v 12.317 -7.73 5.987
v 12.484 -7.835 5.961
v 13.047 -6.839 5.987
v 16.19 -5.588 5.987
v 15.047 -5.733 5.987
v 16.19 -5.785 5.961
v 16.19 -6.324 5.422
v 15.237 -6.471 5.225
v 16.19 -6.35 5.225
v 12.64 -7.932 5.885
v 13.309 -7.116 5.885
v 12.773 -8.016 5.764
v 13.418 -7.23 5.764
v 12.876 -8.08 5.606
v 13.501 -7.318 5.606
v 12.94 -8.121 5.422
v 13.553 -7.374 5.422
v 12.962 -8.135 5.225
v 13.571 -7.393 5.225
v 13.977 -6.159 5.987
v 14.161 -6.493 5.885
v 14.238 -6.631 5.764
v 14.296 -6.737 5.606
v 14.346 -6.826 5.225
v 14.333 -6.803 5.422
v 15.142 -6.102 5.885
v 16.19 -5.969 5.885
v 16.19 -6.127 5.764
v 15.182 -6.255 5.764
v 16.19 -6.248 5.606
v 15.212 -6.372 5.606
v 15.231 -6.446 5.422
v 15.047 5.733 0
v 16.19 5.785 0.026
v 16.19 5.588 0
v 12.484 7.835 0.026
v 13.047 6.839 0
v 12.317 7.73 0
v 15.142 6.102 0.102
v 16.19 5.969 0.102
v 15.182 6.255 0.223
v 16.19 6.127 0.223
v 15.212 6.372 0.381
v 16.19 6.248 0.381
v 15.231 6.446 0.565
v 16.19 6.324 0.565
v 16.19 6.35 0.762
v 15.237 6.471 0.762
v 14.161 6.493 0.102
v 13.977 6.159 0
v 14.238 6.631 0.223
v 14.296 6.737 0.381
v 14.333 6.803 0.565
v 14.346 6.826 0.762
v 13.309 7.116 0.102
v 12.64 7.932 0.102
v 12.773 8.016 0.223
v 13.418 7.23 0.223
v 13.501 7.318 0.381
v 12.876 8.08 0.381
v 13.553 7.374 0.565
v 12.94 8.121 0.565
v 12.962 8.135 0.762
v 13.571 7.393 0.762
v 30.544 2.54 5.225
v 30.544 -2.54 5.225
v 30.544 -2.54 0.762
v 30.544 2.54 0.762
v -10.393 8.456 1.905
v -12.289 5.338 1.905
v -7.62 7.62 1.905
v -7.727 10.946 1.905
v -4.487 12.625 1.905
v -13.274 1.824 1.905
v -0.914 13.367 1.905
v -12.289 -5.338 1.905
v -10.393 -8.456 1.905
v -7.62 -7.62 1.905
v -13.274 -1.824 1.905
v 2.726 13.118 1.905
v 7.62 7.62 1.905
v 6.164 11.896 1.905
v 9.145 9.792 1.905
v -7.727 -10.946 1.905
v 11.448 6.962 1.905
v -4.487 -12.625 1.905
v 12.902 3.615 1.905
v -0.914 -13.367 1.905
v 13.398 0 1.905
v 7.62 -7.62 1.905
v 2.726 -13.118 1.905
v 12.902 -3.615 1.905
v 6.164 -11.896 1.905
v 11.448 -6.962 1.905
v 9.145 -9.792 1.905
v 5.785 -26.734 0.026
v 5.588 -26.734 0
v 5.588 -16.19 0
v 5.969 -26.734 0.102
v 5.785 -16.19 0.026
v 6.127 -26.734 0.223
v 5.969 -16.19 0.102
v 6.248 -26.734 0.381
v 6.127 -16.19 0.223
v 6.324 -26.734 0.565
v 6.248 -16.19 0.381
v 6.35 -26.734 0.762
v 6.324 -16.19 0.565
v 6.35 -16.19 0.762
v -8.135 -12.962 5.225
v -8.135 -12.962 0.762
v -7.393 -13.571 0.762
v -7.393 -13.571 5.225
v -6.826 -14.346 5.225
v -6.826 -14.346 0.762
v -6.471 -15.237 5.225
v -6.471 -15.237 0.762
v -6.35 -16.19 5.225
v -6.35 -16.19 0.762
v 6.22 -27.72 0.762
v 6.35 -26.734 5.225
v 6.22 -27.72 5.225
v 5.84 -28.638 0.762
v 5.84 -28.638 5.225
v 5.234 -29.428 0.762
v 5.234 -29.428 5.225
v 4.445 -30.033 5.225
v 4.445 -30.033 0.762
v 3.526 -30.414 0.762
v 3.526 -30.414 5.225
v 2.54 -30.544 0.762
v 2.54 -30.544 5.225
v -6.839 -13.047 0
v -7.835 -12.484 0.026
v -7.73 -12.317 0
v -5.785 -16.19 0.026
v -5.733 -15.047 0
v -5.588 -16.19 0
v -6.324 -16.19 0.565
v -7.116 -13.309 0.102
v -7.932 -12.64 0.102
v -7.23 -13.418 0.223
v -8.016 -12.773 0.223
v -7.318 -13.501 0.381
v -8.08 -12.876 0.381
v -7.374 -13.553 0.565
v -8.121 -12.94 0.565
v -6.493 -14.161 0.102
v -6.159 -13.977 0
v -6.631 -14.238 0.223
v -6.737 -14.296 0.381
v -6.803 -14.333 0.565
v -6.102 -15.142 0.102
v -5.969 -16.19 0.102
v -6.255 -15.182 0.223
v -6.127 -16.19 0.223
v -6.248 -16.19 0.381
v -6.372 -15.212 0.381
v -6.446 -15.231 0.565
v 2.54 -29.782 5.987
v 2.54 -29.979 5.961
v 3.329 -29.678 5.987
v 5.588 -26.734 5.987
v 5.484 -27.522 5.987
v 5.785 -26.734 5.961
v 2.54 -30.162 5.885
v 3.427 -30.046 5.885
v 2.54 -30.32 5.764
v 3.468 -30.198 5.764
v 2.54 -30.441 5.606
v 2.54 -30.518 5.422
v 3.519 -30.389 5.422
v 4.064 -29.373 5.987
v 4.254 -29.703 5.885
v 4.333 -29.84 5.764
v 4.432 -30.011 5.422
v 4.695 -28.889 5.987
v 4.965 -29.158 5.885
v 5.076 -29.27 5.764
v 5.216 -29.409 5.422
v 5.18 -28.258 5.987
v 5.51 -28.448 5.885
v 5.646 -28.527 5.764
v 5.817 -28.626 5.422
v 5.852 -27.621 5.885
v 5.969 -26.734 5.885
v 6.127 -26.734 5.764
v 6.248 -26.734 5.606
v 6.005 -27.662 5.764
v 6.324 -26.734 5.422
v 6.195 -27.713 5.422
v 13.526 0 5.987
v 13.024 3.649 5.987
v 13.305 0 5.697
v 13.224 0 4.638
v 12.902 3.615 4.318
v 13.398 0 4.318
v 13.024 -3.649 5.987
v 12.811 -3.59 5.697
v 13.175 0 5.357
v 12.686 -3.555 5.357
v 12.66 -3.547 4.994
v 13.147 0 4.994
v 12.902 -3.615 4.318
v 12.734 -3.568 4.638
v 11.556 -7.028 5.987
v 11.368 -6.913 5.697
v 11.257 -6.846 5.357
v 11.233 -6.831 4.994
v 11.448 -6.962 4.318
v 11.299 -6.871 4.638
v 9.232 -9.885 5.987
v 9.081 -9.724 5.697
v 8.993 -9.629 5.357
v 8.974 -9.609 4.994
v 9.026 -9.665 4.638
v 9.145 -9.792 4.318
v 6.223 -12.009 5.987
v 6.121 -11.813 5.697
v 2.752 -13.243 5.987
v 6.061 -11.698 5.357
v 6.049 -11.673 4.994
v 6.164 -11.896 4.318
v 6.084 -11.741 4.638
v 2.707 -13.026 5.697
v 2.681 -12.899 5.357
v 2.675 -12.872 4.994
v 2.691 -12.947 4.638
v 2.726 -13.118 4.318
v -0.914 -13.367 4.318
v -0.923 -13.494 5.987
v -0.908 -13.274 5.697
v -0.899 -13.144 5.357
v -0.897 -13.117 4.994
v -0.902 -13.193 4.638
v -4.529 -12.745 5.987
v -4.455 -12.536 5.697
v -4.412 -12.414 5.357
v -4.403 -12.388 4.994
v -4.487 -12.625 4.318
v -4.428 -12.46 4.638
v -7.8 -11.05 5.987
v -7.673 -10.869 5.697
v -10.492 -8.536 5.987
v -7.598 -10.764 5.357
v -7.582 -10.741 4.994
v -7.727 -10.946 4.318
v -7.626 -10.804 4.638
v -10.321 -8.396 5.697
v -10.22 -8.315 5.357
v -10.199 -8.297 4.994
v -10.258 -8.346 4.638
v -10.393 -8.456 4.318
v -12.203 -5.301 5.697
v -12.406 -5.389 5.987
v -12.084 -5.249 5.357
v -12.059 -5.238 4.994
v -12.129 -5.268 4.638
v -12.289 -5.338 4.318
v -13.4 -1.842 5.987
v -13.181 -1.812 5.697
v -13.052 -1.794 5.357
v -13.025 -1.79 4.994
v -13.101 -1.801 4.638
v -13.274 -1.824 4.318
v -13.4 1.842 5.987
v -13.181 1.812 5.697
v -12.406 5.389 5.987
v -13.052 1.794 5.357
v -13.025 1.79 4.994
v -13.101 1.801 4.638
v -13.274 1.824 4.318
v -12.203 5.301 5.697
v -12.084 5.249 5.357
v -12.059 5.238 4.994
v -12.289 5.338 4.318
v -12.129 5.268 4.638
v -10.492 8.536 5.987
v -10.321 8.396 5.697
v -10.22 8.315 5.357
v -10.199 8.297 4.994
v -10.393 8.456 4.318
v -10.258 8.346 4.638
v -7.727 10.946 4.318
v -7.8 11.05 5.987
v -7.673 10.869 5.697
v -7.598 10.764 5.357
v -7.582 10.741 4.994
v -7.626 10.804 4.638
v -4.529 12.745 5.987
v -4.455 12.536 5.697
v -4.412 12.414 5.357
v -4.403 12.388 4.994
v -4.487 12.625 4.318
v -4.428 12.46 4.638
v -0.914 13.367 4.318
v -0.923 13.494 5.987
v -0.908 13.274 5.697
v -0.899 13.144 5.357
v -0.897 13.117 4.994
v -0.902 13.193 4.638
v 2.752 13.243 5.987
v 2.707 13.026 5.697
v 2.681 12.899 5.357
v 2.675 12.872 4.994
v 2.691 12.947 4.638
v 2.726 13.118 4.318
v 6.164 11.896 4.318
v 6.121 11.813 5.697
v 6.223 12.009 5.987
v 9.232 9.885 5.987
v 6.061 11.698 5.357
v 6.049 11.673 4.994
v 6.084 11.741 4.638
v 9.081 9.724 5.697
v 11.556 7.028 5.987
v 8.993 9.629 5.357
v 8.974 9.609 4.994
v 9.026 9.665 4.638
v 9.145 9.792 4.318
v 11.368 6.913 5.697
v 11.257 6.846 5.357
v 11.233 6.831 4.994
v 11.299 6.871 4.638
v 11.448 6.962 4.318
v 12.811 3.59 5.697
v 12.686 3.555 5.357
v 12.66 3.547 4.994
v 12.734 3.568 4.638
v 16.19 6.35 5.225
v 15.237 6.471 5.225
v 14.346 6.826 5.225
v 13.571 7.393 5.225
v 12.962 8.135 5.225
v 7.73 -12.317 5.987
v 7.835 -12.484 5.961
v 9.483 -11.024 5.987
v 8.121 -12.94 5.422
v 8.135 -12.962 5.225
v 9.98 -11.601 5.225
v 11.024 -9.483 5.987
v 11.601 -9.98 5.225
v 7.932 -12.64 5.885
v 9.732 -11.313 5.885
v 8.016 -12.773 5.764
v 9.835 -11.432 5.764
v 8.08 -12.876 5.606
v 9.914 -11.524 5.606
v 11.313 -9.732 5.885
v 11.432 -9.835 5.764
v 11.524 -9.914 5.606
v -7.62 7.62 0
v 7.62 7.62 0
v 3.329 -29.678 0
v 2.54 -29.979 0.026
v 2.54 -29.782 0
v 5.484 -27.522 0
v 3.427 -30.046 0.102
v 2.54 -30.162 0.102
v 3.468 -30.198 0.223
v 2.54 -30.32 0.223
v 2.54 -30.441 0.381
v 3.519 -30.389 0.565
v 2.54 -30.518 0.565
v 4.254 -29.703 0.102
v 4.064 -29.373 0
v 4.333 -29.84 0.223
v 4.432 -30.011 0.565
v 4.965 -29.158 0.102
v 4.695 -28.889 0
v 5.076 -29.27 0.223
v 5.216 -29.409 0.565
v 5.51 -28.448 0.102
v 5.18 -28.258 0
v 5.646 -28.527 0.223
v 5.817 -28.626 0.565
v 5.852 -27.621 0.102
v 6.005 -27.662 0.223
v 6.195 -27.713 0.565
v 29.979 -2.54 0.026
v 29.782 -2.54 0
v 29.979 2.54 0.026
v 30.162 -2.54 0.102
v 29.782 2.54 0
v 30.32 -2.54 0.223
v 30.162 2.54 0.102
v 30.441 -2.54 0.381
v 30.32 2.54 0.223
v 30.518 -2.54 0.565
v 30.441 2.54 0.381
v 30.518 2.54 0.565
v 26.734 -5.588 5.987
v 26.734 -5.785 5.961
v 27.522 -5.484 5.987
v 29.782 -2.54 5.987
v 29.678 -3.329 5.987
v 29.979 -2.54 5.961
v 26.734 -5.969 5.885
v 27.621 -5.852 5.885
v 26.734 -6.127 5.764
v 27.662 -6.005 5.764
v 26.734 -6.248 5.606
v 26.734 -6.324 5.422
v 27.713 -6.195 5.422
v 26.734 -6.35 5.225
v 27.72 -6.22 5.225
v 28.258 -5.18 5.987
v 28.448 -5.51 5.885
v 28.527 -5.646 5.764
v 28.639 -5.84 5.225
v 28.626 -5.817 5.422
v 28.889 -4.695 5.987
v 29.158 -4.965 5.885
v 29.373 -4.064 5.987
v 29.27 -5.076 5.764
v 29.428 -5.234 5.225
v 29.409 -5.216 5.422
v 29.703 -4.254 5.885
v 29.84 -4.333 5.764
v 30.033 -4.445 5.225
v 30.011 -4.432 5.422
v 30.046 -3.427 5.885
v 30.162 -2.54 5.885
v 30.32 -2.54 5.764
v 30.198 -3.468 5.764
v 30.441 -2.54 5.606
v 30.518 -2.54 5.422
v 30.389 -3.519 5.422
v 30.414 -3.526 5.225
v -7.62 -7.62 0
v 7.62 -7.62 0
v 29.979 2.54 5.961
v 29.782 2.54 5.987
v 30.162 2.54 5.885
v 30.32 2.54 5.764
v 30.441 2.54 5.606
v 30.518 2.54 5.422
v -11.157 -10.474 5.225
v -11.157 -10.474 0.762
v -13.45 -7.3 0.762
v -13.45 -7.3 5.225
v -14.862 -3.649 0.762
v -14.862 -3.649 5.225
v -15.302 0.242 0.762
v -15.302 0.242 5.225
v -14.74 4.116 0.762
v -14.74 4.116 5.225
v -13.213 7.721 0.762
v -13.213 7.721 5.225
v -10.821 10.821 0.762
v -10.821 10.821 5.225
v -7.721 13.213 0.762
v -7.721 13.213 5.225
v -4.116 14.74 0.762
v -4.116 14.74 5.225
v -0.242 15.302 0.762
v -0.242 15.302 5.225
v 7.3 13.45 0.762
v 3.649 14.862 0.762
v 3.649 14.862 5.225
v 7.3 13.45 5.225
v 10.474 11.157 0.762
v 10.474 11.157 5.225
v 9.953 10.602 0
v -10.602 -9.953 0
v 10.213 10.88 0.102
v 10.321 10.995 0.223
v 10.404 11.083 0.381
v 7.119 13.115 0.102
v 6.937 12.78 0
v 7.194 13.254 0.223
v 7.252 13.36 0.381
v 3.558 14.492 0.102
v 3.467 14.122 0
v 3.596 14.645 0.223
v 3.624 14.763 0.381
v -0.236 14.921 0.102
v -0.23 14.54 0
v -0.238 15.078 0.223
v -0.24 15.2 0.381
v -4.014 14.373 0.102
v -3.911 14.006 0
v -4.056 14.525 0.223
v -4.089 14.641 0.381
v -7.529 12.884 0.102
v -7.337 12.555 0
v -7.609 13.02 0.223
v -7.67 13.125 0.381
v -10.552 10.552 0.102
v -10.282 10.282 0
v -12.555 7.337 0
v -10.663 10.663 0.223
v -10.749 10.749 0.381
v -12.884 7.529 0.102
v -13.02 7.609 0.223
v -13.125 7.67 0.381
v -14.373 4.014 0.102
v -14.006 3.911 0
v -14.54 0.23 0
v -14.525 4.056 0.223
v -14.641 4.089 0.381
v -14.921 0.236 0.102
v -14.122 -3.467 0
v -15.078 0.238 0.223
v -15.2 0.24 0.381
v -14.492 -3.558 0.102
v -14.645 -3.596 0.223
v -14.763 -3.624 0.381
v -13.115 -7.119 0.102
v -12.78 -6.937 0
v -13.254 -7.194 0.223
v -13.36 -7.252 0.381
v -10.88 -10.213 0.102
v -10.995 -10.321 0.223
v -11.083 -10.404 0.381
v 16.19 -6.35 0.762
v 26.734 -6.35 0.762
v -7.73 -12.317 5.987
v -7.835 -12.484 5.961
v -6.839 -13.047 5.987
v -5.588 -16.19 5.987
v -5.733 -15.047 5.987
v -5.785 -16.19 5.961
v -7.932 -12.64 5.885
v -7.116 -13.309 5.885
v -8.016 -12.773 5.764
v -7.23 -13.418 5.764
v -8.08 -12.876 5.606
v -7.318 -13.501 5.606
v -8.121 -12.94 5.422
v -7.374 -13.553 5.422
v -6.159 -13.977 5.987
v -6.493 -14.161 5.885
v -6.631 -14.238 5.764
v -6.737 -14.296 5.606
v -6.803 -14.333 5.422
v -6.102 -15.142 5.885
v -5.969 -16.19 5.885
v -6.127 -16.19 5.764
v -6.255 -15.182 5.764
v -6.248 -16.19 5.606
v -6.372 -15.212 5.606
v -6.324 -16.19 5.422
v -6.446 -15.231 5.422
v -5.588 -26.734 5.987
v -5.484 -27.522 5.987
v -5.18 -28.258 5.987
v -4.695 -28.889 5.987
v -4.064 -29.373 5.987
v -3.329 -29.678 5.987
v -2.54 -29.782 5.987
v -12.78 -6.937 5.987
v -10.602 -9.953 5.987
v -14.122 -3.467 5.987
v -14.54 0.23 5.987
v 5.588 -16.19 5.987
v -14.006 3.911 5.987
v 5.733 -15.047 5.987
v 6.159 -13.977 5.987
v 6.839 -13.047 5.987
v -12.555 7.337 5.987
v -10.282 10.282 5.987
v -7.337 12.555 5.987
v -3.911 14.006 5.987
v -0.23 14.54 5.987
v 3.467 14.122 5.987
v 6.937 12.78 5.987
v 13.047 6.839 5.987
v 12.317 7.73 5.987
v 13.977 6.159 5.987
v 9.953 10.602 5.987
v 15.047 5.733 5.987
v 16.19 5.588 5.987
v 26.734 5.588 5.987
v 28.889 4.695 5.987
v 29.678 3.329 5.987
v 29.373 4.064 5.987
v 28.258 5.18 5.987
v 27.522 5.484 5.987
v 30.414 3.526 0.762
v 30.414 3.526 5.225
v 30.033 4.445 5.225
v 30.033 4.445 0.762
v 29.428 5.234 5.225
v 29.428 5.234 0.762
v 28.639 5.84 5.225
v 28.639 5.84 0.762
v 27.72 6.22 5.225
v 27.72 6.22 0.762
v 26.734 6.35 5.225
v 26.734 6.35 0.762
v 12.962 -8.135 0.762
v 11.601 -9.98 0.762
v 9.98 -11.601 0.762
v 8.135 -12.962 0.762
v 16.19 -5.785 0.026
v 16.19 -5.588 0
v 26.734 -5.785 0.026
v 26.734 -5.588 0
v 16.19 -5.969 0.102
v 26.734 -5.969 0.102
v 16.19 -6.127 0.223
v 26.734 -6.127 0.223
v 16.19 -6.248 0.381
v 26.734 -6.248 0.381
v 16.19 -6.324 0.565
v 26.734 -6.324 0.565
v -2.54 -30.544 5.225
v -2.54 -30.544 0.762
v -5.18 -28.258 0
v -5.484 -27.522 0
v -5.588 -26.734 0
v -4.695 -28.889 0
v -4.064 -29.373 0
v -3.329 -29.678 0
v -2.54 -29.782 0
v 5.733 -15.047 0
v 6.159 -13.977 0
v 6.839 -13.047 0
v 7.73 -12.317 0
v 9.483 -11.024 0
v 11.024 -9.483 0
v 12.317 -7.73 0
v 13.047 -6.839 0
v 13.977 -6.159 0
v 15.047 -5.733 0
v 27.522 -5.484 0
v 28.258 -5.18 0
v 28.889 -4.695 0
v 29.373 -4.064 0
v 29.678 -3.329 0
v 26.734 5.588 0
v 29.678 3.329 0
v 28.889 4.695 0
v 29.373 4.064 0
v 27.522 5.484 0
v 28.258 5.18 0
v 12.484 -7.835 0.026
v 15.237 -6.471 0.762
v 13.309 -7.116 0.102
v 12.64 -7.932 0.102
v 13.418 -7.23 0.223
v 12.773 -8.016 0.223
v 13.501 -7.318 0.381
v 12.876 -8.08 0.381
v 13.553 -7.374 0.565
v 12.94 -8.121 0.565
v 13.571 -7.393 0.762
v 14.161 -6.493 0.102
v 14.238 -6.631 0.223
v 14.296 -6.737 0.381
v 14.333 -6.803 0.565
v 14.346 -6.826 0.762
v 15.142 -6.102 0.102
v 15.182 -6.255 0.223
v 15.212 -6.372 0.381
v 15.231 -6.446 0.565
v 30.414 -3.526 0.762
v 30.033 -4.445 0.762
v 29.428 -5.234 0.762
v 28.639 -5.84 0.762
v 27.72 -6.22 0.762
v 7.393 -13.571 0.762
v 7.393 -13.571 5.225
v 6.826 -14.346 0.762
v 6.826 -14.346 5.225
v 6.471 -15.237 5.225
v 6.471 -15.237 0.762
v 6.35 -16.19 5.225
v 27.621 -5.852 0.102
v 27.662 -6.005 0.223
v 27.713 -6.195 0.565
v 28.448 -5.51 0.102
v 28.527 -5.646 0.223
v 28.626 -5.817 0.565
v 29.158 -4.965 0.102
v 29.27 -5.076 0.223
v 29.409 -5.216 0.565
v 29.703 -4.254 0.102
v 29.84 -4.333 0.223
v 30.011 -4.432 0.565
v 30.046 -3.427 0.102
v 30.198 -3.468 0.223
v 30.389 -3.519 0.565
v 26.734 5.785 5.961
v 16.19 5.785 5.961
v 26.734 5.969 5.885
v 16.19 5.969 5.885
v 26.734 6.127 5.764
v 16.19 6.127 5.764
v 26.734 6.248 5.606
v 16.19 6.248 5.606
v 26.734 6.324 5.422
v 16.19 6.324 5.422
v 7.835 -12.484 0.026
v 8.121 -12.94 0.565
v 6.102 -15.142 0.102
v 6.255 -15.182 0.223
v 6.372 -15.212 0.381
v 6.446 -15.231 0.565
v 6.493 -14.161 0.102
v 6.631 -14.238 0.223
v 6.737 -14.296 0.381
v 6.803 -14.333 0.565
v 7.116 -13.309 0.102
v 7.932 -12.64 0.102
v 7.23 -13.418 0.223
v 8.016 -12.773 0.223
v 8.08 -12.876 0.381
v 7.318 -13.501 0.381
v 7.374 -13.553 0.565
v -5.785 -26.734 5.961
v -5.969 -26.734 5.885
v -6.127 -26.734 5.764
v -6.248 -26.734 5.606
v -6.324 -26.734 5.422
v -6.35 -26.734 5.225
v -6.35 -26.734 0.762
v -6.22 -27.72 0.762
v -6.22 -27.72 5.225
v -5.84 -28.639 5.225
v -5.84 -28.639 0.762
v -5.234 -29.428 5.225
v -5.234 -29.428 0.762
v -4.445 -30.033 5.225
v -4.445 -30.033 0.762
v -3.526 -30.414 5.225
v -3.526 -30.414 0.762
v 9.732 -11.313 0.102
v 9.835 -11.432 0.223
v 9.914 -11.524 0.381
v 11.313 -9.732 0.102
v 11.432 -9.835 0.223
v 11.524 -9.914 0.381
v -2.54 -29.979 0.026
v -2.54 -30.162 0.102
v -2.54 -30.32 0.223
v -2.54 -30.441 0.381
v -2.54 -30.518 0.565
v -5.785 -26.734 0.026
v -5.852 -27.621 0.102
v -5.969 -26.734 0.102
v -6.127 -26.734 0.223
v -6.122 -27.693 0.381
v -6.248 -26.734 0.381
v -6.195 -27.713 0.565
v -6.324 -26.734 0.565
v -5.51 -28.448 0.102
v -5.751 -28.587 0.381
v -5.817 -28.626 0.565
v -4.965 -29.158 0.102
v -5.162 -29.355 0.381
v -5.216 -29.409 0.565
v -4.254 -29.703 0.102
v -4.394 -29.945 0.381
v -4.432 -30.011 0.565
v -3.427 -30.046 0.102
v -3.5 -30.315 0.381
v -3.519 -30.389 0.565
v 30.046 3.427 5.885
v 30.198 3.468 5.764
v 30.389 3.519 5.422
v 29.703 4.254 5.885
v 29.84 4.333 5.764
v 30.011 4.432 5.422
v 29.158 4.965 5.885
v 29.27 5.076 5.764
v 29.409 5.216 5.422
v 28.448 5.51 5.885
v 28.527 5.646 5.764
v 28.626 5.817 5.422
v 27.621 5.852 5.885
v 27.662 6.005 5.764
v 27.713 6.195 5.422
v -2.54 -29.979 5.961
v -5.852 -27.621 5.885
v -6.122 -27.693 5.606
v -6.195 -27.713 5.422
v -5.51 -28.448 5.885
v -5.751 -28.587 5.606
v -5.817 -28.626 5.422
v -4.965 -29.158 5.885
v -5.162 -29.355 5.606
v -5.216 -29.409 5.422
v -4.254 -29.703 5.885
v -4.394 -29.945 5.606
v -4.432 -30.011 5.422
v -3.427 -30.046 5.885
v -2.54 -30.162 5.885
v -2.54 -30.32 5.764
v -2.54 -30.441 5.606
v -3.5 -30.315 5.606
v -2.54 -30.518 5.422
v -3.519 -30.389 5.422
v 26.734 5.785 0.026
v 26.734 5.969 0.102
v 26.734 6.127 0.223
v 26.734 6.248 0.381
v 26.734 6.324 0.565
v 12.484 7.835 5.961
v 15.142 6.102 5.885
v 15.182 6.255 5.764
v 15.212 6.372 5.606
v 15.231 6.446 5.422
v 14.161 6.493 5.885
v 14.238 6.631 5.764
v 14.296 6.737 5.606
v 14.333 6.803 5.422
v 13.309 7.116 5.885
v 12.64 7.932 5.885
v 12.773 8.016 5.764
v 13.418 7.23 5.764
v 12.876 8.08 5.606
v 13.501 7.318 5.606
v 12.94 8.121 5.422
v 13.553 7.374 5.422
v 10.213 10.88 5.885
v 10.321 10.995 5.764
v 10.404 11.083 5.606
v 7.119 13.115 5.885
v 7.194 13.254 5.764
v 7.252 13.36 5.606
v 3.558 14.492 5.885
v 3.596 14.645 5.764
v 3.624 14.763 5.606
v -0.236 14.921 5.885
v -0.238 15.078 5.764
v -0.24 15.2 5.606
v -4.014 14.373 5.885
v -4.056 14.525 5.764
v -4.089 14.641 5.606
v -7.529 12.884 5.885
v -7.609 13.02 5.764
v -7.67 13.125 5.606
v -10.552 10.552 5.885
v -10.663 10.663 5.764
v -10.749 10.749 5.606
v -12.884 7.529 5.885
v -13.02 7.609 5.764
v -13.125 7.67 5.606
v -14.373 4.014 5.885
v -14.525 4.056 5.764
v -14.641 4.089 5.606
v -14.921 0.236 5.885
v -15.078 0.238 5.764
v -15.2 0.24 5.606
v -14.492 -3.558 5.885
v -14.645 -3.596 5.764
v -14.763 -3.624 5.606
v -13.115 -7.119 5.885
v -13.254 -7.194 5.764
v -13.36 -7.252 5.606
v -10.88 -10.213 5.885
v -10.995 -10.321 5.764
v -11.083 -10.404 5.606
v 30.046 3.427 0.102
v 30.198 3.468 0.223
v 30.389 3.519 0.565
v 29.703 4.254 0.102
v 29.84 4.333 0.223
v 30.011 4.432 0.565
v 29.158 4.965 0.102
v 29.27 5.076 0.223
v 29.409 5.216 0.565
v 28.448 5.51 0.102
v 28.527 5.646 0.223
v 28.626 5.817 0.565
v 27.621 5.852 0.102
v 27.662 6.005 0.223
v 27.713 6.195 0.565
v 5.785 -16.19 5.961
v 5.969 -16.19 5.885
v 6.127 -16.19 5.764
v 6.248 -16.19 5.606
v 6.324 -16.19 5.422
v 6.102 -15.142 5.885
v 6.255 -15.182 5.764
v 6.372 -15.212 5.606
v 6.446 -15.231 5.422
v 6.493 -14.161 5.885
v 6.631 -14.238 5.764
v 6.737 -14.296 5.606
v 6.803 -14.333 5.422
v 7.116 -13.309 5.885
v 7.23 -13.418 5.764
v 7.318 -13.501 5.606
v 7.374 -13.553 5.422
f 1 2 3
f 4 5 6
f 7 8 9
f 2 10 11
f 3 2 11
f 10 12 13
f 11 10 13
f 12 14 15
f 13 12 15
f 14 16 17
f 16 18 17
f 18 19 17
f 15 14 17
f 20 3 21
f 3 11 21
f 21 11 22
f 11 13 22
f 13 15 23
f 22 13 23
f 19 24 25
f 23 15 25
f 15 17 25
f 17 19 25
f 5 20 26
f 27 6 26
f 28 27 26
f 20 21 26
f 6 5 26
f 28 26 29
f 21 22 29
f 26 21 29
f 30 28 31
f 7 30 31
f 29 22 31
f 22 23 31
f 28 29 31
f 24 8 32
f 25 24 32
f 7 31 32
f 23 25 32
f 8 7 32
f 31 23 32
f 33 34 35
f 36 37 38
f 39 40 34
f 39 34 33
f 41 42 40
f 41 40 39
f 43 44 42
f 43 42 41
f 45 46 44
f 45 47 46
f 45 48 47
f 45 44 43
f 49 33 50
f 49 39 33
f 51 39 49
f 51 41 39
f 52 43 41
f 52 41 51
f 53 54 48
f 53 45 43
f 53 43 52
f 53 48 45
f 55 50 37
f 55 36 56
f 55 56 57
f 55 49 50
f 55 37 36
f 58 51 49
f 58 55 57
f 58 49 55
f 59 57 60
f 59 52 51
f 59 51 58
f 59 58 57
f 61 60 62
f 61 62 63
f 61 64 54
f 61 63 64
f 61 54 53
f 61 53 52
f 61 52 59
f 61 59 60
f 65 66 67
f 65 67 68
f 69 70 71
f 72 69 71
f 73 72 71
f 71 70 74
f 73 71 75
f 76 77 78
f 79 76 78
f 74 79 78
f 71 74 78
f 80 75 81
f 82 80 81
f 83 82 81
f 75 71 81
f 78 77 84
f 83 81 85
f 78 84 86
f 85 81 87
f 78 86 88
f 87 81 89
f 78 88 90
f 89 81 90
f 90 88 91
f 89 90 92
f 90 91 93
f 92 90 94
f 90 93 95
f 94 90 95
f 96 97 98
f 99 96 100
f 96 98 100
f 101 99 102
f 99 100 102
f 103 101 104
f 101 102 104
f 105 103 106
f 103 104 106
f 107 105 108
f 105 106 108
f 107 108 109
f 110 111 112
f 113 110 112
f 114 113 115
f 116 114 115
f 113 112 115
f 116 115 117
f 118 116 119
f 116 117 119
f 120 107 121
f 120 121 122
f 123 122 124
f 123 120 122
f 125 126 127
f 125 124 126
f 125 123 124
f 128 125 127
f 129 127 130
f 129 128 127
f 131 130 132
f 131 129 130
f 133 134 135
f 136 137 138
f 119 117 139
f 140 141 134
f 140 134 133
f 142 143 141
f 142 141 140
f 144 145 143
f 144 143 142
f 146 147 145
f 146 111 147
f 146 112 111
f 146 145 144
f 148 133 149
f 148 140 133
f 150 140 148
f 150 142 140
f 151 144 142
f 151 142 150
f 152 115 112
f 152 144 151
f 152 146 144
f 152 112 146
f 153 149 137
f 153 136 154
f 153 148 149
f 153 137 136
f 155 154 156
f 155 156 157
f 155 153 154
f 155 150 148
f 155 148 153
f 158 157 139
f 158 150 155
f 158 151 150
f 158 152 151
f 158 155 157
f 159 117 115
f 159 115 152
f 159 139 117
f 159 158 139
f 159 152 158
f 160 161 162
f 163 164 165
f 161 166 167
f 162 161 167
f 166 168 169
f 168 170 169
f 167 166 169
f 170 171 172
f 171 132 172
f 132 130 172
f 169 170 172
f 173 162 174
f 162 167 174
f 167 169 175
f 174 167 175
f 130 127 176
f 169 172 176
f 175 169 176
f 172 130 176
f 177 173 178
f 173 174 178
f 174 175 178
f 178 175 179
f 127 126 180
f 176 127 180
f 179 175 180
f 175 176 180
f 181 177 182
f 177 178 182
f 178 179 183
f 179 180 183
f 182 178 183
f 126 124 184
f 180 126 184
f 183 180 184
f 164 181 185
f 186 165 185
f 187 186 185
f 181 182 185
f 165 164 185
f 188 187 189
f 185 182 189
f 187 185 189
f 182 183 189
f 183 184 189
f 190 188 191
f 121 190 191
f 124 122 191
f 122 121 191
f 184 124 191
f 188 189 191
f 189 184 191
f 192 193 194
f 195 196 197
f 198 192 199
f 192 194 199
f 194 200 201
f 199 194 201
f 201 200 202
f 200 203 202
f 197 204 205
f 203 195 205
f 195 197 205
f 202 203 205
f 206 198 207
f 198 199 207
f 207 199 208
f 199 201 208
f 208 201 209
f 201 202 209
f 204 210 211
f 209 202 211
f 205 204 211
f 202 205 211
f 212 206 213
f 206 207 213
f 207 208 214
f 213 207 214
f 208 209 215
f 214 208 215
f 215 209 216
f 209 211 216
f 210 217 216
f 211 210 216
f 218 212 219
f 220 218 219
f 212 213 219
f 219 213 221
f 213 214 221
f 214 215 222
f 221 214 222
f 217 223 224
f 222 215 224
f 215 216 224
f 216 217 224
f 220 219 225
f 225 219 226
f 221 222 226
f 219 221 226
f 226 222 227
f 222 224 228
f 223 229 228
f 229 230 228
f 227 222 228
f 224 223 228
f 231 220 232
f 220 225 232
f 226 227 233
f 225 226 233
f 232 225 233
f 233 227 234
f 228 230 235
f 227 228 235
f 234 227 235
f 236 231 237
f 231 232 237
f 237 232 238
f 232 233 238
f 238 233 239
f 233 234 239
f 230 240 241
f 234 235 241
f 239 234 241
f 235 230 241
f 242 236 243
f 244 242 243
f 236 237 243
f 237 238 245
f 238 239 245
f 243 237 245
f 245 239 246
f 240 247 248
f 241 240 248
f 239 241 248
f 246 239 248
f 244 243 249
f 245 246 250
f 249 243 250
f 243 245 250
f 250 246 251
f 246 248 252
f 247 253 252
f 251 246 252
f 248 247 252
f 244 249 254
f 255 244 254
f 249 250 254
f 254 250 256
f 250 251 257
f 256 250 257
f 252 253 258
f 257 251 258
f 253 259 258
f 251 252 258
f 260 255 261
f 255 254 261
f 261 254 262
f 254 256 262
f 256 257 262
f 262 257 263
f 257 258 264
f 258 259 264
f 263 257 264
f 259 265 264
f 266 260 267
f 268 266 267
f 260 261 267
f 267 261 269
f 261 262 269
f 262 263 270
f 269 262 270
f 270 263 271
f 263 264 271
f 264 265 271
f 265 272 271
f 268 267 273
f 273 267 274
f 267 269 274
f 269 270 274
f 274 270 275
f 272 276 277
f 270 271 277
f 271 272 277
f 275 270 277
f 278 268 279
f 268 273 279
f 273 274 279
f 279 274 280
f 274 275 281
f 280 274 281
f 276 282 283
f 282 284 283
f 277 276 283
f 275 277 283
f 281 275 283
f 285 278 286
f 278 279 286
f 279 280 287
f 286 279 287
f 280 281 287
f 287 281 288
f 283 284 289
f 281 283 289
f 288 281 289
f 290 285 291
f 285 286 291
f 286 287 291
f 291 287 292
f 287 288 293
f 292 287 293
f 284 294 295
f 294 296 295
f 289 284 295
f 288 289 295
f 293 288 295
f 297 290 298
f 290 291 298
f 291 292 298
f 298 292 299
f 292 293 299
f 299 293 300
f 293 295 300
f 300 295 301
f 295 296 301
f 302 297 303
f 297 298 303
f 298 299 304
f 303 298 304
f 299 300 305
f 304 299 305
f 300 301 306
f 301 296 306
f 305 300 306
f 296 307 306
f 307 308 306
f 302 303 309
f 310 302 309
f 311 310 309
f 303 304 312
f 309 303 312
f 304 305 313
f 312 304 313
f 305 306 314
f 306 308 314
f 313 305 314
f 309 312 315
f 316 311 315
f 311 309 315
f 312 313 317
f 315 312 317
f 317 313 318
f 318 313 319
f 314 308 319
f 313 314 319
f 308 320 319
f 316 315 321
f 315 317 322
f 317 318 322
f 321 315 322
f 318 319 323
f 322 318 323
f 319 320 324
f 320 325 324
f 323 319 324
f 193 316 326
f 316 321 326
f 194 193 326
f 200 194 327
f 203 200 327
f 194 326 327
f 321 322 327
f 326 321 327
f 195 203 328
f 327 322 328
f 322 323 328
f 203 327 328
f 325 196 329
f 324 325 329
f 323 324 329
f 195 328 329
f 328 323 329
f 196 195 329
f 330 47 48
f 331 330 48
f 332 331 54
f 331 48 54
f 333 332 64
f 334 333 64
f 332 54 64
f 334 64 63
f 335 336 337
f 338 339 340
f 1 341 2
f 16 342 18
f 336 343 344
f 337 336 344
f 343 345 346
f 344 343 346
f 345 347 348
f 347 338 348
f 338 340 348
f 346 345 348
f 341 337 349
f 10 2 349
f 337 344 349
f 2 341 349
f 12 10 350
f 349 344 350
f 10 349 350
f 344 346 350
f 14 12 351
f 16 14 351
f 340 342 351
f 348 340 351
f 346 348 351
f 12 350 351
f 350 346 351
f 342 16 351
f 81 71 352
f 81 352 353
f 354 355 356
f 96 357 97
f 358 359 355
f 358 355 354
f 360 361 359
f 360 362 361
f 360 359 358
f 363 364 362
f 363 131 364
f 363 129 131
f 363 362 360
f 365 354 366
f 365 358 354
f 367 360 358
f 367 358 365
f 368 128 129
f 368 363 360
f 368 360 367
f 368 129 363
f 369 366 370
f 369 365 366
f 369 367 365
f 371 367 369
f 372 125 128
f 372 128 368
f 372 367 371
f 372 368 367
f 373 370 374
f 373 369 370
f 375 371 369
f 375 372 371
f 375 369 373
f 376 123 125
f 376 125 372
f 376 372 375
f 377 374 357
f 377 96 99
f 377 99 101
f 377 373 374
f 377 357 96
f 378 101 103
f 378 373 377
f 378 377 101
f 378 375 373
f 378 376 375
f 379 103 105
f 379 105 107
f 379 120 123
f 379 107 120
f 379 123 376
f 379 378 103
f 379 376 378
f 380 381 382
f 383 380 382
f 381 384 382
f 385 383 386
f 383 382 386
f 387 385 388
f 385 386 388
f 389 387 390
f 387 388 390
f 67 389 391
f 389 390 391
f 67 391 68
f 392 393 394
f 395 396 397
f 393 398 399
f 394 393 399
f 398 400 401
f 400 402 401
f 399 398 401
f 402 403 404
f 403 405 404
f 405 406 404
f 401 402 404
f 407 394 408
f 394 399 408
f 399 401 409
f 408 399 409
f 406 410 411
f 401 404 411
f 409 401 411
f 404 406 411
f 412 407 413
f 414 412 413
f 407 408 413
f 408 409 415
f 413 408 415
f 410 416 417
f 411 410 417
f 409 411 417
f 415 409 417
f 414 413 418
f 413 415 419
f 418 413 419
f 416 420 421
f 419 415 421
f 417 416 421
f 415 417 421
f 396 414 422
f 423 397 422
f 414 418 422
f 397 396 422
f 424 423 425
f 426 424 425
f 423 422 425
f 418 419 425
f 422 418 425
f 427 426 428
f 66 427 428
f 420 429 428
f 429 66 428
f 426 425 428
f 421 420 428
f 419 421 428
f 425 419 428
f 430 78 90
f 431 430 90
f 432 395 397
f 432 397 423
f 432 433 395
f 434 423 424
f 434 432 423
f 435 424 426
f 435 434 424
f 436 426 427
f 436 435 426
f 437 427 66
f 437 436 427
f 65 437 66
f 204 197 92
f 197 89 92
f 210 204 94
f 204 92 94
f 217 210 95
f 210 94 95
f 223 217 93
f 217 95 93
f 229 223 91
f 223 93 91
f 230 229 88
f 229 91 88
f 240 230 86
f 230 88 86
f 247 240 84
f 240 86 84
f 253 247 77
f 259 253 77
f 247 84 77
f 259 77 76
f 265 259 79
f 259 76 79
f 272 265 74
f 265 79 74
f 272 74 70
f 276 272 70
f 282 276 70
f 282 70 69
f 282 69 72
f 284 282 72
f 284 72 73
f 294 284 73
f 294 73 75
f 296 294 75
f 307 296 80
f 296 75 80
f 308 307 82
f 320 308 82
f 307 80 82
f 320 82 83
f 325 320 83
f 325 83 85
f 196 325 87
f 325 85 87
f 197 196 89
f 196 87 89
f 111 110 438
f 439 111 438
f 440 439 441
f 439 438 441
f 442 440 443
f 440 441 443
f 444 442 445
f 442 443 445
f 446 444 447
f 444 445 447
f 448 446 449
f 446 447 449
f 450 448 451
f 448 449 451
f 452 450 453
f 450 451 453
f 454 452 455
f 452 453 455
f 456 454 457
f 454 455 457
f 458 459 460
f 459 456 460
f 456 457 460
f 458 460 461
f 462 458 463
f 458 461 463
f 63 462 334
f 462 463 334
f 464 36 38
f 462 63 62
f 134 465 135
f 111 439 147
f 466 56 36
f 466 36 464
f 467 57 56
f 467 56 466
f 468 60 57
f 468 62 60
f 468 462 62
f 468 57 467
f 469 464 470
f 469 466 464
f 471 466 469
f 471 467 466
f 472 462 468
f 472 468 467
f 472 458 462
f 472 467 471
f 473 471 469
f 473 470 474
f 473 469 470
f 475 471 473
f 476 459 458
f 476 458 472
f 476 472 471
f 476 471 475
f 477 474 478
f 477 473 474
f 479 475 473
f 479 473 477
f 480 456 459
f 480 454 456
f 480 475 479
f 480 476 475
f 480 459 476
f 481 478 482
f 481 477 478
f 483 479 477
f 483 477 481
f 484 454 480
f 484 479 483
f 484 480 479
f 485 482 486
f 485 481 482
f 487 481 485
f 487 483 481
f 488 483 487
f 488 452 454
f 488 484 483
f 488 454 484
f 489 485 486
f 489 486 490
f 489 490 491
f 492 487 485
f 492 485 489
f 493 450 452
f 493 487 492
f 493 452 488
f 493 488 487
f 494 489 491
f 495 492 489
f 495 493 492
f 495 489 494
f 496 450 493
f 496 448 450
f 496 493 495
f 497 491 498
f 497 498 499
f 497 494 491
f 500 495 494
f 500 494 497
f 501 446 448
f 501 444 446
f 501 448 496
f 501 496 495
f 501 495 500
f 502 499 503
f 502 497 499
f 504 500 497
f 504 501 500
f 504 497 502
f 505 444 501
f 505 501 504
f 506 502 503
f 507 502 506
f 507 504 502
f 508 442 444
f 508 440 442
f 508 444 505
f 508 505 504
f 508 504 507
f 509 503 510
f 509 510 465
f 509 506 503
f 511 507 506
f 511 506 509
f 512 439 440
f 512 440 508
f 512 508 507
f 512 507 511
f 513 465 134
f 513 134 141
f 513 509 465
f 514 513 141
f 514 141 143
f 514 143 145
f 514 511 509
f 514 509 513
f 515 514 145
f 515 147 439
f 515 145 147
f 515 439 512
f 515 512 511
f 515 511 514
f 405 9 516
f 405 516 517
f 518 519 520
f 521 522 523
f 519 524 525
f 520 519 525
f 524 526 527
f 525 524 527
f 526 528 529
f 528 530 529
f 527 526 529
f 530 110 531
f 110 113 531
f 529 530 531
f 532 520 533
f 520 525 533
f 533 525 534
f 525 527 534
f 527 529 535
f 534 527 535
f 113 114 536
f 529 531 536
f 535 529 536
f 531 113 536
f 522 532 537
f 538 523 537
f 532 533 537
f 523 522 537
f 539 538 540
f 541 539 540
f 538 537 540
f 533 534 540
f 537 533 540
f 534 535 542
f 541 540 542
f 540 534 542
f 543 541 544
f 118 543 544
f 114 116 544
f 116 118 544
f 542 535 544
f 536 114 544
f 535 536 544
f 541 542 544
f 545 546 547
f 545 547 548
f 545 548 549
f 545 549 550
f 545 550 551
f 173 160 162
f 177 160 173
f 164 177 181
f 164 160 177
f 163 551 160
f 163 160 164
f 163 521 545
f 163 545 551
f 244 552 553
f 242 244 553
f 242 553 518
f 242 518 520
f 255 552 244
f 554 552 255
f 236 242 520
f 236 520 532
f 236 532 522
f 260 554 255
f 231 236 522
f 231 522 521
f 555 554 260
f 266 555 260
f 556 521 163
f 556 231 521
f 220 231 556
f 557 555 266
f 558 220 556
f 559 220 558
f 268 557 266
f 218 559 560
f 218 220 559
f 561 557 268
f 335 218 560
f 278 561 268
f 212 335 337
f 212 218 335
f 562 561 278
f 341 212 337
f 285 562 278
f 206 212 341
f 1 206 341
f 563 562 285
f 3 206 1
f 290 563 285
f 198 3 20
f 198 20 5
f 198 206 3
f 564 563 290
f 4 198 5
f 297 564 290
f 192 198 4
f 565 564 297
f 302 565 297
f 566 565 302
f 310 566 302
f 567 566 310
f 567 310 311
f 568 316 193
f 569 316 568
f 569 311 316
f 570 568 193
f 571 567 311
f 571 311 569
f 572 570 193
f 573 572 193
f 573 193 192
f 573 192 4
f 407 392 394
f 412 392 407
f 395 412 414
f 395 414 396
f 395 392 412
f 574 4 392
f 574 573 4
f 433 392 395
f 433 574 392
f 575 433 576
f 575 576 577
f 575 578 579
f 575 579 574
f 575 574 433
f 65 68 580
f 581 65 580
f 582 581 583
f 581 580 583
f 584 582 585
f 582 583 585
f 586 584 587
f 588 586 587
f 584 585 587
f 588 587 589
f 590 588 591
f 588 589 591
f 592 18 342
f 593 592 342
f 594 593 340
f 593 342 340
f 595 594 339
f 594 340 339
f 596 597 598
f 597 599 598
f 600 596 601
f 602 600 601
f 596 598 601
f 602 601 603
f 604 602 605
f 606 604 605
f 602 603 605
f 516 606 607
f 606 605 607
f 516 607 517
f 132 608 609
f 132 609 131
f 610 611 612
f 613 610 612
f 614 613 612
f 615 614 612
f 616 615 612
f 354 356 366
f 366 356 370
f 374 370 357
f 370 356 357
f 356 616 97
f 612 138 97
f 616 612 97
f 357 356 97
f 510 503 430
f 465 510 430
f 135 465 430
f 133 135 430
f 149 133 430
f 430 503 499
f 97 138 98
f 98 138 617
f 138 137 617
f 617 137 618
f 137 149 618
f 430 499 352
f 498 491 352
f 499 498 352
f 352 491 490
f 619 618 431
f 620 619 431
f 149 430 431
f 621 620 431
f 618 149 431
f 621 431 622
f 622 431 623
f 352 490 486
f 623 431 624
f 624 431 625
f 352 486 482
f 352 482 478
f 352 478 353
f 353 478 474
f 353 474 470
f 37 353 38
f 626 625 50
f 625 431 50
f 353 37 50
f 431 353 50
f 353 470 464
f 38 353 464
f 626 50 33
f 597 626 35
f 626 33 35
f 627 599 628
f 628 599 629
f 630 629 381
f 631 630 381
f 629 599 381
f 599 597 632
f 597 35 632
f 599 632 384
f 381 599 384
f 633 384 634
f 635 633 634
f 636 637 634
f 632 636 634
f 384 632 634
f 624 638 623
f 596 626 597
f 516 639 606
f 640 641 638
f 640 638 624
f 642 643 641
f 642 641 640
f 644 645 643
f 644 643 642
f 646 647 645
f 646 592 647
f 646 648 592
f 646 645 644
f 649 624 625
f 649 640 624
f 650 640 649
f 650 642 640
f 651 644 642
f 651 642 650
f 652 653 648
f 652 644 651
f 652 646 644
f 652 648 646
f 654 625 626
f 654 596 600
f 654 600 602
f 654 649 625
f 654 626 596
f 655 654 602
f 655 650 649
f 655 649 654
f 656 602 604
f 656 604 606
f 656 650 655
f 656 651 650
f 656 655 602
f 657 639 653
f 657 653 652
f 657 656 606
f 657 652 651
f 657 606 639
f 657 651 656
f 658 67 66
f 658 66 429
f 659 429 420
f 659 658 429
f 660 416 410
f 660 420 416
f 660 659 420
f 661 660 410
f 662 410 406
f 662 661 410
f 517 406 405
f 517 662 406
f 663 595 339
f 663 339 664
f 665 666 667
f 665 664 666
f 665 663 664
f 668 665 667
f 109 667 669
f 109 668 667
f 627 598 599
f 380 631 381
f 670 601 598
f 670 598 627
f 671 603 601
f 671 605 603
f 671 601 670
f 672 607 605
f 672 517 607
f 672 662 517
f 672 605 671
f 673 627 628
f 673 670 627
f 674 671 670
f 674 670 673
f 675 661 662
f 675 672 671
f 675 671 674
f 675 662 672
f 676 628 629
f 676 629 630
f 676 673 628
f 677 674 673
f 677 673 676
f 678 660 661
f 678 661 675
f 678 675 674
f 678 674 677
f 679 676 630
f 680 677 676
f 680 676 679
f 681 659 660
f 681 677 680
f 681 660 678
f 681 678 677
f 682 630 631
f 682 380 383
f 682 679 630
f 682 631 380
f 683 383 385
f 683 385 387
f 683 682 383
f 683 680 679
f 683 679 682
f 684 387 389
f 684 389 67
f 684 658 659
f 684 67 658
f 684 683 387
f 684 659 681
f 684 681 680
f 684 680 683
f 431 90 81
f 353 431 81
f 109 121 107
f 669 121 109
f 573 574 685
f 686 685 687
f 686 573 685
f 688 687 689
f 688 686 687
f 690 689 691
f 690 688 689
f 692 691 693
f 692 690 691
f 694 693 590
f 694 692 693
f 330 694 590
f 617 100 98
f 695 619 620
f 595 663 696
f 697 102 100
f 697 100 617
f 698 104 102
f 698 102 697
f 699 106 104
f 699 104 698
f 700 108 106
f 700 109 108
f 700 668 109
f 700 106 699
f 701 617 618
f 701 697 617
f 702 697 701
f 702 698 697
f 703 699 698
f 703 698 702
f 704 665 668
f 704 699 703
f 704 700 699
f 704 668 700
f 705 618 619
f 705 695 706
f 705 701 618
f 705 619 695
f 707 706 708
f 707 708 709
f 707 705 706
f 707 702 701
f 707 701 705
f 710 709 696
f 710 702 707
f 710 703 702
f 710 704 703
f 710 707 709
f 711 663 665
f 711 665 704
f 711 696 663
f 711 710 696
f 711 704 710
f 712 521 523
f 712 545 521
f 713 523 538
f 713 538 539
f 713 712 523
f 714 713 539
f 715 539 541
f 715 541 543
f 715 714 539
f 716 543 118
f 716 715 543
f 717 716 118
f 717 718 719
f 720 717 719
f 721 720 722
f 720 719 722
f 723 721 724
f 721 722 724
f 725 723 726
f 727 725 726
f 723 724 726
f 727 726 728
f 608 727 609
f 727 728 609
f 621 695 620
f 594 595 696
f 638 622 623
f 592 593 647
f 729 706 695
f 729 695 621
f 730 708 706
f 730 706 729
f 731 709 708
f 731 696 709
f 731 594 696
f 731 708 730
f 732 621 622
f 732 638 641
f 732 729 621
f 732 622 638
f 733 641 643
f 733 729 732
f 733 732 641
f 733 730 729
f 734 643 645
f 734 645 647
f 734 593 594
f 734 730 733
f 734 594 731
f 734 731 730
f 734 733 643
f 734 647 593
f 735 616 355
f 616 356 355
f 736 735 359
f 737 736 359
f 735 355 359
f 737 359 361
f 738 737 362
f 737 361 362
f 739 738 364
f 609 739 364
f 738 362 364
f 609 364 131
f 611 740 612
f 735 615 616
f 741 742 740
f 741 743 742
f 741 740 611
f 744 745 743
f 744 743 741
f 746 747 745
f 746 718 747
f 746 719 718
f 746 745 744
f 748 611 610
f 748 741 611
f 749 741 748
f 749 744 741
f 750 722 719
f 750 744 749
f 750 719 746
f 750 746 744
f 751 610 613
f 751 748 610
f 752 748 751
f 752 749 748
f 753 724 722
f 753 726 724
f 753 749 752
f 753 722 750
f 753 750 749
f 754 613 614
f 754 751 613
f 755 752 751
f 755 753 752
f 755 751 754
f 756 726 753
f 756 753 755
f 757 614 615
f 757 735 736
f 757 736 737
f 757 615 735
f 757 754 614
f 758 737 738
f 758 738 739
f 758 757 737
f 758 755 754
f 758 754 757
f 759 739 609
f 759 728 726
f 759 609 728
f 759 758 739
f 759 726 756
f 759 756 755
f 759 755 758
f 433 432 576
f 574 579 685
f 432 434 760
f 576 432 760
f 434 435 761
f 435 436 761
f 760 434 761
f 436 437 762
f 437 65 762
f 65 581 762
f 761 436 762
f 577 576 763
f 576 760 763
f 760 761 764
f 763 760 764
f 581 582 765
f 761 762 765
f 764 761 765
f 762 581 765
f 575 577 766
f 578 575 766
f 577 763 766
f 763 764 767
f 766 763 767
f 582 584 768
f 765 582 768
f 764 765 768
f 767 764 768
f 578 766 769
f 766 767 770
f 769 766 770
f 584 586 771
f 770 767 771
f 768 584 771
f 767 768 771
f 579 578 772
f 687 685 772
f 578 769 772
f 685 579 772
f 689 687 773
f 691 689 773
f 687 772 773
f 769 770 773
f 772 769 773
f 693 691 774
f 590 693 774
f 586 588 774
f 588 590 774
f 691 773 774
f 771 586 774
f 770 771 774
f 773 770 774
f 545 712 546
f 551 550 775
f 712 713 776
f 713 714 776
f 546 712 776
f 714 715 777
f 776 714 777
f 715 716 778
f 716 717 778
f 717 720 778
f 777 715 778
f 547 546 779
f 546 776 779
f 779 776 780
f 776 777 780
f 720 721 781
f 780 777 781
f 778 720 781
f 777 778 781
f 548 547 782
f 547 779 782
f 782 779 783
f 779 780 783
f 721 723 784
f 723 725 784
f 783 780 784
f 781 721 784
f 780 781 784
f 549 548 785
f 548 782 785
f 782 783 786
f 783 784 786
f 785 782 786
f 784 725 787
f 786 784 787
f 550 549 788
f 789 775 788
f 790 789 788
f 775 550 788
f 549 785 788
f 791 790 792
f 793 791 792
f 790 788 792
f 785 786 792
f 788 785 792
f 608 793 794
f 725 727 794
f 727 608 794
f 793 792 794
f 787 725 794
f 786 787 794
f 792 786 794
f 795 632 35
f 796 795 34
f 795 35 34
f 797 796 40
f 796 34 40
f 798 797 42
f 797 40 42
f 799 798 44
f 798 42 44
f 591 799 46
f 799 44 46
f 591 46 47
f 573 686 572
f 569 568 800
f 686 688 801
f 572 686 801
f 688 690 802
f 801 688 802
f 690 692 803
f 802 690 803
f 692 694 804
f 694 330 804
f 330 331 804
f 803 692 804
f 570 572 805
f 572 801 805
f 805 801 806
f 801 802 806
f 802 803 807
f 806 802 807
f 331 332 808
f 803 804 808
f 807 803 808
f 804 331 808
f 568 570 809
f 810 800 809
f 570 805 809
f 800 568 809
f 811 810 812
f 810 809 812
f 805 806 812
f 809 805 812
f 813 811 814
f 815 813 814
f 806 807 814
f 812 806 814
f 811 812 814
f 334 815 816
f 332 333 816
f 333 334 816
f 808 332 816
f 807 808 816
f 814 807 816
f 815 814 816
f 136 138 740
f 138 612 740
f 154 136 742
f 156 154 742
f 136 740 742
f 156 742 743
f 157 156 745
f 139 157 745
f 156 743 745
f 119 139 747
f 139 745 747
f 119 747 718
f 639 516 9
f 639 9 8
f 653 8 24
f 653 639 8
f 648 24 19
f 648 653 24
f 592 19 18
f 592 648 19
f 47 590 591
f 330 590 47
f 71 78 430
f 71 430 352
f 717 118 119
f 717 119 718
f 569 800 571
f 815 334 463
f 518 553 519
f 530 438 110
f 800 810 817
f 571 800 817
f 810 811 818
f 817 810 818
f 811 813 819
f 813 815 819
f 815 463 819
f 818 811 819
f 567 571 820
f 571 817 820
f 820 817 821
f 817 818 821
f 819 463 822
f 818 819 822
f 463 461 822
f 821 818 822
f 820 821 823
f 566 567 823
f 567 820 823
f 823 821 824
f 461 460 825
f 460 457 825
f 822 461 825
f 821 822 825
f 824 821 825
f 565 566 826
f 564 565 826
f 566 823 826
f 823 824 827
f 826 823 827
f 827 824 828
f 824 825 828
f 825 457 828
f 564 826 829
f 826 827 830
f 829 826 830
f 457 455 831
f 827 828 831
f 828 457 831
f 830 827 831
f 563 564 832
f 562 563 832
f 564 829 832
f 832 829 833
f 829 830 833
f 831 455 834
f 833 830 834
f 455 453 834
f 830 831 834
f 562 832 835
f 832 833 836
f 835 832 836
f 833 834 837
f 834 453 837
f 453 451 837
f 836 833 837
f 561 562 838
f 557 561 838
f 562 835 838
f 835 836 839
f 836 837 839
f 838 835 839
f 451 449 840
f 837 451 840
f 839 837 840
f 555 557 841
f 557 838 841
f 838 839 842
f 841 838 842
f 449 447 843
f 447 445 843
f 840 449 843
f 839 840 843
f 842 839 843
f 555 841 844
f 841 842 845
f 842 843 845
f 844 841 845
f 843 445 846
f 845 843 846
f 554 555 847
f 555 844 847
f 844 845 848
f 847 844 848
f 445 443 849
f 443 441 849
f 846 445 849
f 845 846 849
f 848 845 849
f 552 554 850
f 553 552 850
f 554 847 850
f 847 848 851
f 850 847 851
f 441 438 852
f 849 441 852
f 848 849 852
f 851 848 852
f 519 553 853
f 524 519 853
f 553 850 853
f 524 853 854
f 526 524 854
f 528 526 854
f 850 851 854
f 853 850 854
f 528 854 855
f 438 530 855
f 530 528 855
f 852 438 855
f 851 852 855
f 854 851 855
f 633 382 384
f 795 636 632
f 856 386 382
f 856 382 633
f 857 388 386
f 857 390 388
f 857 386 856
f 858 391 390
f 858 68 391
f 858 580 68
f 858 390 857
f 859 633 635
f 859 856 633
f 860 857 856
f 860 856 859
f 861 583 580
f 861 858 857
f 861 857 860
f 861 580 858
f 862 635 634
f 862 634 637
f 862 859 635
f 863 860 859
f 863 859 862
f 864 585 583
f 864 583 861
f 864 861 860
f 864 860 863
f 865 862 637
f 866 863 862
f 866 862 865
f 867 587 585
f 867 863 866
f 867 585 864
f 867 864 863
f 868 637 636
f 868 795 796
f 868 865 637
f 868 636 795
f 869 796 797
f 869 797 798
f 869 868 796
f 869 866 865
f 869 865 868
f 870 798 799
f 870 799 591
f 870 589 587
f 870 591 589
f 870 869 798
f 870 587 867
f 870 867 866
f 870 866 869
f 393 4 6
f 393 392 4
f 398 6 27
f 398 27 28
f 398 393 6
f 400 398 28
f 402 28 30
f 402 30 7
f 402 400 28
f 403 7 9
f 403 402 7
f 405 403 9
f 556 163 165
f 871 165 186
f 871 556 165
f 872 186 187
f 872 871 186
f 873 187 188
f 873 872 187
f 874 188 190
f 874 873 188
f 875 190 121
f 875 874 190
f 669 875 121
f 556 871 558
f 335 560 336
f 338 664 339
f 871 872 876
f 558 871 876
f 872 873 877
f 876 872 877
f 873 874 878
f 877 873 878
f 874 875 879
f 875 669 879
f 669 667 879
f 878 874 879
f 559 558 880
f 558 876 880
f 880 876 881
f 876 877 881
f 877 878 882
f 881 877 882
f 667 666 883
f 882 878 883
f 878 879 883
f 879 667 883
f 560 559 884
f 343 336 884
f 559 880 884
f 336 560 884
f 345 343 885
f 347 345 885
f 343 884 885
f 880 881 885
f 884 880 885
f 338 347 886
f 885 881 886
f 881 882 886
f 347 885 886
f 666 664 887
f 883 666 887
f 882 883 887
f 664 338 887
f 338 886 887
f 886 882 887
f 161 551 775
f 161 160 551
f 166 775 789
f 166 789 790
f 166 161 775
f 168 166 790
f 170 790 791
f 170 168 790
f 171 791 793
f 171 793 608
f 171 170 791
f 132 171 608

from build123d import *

# Parameters (mm, degrees)
F3_DEPTH = 5.9869614104
F4_R     = 3.81
F5_R     = 0.762
F6_W     = 15.24
F6_H     = 15.24
F7_DEPTH = 25.4


with BuildPart() as f1:
    # F0 (on Front) → F1 (revolve)
    with BuildSketch(Plane.XZ):
        with BuildLine():
            Line((15.3035, 0), (15.3035, 4.1730385896))
            ThreePointArc((15.3035, 4.1730385896), (14.3181376493, 3.8136610654), (13.3985, 4.318))
            Line((13.3985, 4.318), (13.3985, 1.905))
            Line((13.3985, 1.905), (0, 1.905))
            Line((0, 1.905), (0, 0))
            Line((0, 0), (15.3035, 0))
        make_face()
        with BuildLine():
            ThreePointArc((13.3985, 4.318), (14.3181376493, 3.8136610654), (15.3035, 4.1730385896))
            Line((15.3035, 4.1730385896), (15.3035, 5.9869614104))
            Line((15.3035, 5.9869614104), (13.5255, 5.9869614104))
            ThreePointArc((13.5255, 5.9869614104), (13.1481610654, 5.1763623507), (13.3985, 4.318))
        make_face()
    revolve(axis=Axis((0, 0, 4.2298094004), (0, 0, -1)))

    # F2 (on face) → F3 (join, through all)
    with BuildSketch(Plane.XY.offset(5.9869614104)):
        with BuildLine():
            Line((30.5435, -6.35), (30.5435, 6.35))
            Line((30.5435, 6.35), (13.9238863917, 6.35))
            ThreePointArc((13.9238863917, 6.35), (15.3035, 0), (13.9238863917, -6.35))
            Line((13.9238863917, -6.35), (30.5435, -6.35))
        make_face()
        with BuildLine():
            Line((-6.35, -30.5435), (6.35, -30.5435))
            Line((6.35, -30.5435), (6.35, -13.9238863917))
            ThreePointArc((6.35, -13.9238863917), (0, -15.3035), (-6.35, -13.9238863917))
            Line((-6.35, -13.9238863917), (-6.35, -30.5435))
        make_face()
    extrude(amount=-F3_DEPTH)

    # F4
    f4_edges = [f1.edges().sort_by_distance(p)[0] for p in [
        (-6.35, -30.5435, 2.993481),
        (-6.35, -13.923886, 2.993481),
        (6.35, -30.5435, 2.993481),
        (6.35, -13.923886, 2.993481),
        (13.923886, -6.35, 2.993481),
        (30.5435, -6.35, 2.993481),
        (30.5435, 6.35, 2.993481),
        (13.923886, 6.35, 2.993481),
    ]]
    fillet(f4_edges, radius=F4_R)

    # F5
    f5_edges = [f1.edges().sort_by_distance(p)[0] for p in [
        (0, -30.5435, 5.986961),
        (0, -30.5435, 0),
    ]]
    fillet(f5_edges, radius=F5_R)

    # F6 (on face) → F7 (cut)
    with BuildSketch(Plane.XY.offset(1.905)):
        Rectangle(F6_W, F6_H)
    extrude(amount=-F7_DEPTH, mode=Mode.SUBTRACT)


solid = f1.part
